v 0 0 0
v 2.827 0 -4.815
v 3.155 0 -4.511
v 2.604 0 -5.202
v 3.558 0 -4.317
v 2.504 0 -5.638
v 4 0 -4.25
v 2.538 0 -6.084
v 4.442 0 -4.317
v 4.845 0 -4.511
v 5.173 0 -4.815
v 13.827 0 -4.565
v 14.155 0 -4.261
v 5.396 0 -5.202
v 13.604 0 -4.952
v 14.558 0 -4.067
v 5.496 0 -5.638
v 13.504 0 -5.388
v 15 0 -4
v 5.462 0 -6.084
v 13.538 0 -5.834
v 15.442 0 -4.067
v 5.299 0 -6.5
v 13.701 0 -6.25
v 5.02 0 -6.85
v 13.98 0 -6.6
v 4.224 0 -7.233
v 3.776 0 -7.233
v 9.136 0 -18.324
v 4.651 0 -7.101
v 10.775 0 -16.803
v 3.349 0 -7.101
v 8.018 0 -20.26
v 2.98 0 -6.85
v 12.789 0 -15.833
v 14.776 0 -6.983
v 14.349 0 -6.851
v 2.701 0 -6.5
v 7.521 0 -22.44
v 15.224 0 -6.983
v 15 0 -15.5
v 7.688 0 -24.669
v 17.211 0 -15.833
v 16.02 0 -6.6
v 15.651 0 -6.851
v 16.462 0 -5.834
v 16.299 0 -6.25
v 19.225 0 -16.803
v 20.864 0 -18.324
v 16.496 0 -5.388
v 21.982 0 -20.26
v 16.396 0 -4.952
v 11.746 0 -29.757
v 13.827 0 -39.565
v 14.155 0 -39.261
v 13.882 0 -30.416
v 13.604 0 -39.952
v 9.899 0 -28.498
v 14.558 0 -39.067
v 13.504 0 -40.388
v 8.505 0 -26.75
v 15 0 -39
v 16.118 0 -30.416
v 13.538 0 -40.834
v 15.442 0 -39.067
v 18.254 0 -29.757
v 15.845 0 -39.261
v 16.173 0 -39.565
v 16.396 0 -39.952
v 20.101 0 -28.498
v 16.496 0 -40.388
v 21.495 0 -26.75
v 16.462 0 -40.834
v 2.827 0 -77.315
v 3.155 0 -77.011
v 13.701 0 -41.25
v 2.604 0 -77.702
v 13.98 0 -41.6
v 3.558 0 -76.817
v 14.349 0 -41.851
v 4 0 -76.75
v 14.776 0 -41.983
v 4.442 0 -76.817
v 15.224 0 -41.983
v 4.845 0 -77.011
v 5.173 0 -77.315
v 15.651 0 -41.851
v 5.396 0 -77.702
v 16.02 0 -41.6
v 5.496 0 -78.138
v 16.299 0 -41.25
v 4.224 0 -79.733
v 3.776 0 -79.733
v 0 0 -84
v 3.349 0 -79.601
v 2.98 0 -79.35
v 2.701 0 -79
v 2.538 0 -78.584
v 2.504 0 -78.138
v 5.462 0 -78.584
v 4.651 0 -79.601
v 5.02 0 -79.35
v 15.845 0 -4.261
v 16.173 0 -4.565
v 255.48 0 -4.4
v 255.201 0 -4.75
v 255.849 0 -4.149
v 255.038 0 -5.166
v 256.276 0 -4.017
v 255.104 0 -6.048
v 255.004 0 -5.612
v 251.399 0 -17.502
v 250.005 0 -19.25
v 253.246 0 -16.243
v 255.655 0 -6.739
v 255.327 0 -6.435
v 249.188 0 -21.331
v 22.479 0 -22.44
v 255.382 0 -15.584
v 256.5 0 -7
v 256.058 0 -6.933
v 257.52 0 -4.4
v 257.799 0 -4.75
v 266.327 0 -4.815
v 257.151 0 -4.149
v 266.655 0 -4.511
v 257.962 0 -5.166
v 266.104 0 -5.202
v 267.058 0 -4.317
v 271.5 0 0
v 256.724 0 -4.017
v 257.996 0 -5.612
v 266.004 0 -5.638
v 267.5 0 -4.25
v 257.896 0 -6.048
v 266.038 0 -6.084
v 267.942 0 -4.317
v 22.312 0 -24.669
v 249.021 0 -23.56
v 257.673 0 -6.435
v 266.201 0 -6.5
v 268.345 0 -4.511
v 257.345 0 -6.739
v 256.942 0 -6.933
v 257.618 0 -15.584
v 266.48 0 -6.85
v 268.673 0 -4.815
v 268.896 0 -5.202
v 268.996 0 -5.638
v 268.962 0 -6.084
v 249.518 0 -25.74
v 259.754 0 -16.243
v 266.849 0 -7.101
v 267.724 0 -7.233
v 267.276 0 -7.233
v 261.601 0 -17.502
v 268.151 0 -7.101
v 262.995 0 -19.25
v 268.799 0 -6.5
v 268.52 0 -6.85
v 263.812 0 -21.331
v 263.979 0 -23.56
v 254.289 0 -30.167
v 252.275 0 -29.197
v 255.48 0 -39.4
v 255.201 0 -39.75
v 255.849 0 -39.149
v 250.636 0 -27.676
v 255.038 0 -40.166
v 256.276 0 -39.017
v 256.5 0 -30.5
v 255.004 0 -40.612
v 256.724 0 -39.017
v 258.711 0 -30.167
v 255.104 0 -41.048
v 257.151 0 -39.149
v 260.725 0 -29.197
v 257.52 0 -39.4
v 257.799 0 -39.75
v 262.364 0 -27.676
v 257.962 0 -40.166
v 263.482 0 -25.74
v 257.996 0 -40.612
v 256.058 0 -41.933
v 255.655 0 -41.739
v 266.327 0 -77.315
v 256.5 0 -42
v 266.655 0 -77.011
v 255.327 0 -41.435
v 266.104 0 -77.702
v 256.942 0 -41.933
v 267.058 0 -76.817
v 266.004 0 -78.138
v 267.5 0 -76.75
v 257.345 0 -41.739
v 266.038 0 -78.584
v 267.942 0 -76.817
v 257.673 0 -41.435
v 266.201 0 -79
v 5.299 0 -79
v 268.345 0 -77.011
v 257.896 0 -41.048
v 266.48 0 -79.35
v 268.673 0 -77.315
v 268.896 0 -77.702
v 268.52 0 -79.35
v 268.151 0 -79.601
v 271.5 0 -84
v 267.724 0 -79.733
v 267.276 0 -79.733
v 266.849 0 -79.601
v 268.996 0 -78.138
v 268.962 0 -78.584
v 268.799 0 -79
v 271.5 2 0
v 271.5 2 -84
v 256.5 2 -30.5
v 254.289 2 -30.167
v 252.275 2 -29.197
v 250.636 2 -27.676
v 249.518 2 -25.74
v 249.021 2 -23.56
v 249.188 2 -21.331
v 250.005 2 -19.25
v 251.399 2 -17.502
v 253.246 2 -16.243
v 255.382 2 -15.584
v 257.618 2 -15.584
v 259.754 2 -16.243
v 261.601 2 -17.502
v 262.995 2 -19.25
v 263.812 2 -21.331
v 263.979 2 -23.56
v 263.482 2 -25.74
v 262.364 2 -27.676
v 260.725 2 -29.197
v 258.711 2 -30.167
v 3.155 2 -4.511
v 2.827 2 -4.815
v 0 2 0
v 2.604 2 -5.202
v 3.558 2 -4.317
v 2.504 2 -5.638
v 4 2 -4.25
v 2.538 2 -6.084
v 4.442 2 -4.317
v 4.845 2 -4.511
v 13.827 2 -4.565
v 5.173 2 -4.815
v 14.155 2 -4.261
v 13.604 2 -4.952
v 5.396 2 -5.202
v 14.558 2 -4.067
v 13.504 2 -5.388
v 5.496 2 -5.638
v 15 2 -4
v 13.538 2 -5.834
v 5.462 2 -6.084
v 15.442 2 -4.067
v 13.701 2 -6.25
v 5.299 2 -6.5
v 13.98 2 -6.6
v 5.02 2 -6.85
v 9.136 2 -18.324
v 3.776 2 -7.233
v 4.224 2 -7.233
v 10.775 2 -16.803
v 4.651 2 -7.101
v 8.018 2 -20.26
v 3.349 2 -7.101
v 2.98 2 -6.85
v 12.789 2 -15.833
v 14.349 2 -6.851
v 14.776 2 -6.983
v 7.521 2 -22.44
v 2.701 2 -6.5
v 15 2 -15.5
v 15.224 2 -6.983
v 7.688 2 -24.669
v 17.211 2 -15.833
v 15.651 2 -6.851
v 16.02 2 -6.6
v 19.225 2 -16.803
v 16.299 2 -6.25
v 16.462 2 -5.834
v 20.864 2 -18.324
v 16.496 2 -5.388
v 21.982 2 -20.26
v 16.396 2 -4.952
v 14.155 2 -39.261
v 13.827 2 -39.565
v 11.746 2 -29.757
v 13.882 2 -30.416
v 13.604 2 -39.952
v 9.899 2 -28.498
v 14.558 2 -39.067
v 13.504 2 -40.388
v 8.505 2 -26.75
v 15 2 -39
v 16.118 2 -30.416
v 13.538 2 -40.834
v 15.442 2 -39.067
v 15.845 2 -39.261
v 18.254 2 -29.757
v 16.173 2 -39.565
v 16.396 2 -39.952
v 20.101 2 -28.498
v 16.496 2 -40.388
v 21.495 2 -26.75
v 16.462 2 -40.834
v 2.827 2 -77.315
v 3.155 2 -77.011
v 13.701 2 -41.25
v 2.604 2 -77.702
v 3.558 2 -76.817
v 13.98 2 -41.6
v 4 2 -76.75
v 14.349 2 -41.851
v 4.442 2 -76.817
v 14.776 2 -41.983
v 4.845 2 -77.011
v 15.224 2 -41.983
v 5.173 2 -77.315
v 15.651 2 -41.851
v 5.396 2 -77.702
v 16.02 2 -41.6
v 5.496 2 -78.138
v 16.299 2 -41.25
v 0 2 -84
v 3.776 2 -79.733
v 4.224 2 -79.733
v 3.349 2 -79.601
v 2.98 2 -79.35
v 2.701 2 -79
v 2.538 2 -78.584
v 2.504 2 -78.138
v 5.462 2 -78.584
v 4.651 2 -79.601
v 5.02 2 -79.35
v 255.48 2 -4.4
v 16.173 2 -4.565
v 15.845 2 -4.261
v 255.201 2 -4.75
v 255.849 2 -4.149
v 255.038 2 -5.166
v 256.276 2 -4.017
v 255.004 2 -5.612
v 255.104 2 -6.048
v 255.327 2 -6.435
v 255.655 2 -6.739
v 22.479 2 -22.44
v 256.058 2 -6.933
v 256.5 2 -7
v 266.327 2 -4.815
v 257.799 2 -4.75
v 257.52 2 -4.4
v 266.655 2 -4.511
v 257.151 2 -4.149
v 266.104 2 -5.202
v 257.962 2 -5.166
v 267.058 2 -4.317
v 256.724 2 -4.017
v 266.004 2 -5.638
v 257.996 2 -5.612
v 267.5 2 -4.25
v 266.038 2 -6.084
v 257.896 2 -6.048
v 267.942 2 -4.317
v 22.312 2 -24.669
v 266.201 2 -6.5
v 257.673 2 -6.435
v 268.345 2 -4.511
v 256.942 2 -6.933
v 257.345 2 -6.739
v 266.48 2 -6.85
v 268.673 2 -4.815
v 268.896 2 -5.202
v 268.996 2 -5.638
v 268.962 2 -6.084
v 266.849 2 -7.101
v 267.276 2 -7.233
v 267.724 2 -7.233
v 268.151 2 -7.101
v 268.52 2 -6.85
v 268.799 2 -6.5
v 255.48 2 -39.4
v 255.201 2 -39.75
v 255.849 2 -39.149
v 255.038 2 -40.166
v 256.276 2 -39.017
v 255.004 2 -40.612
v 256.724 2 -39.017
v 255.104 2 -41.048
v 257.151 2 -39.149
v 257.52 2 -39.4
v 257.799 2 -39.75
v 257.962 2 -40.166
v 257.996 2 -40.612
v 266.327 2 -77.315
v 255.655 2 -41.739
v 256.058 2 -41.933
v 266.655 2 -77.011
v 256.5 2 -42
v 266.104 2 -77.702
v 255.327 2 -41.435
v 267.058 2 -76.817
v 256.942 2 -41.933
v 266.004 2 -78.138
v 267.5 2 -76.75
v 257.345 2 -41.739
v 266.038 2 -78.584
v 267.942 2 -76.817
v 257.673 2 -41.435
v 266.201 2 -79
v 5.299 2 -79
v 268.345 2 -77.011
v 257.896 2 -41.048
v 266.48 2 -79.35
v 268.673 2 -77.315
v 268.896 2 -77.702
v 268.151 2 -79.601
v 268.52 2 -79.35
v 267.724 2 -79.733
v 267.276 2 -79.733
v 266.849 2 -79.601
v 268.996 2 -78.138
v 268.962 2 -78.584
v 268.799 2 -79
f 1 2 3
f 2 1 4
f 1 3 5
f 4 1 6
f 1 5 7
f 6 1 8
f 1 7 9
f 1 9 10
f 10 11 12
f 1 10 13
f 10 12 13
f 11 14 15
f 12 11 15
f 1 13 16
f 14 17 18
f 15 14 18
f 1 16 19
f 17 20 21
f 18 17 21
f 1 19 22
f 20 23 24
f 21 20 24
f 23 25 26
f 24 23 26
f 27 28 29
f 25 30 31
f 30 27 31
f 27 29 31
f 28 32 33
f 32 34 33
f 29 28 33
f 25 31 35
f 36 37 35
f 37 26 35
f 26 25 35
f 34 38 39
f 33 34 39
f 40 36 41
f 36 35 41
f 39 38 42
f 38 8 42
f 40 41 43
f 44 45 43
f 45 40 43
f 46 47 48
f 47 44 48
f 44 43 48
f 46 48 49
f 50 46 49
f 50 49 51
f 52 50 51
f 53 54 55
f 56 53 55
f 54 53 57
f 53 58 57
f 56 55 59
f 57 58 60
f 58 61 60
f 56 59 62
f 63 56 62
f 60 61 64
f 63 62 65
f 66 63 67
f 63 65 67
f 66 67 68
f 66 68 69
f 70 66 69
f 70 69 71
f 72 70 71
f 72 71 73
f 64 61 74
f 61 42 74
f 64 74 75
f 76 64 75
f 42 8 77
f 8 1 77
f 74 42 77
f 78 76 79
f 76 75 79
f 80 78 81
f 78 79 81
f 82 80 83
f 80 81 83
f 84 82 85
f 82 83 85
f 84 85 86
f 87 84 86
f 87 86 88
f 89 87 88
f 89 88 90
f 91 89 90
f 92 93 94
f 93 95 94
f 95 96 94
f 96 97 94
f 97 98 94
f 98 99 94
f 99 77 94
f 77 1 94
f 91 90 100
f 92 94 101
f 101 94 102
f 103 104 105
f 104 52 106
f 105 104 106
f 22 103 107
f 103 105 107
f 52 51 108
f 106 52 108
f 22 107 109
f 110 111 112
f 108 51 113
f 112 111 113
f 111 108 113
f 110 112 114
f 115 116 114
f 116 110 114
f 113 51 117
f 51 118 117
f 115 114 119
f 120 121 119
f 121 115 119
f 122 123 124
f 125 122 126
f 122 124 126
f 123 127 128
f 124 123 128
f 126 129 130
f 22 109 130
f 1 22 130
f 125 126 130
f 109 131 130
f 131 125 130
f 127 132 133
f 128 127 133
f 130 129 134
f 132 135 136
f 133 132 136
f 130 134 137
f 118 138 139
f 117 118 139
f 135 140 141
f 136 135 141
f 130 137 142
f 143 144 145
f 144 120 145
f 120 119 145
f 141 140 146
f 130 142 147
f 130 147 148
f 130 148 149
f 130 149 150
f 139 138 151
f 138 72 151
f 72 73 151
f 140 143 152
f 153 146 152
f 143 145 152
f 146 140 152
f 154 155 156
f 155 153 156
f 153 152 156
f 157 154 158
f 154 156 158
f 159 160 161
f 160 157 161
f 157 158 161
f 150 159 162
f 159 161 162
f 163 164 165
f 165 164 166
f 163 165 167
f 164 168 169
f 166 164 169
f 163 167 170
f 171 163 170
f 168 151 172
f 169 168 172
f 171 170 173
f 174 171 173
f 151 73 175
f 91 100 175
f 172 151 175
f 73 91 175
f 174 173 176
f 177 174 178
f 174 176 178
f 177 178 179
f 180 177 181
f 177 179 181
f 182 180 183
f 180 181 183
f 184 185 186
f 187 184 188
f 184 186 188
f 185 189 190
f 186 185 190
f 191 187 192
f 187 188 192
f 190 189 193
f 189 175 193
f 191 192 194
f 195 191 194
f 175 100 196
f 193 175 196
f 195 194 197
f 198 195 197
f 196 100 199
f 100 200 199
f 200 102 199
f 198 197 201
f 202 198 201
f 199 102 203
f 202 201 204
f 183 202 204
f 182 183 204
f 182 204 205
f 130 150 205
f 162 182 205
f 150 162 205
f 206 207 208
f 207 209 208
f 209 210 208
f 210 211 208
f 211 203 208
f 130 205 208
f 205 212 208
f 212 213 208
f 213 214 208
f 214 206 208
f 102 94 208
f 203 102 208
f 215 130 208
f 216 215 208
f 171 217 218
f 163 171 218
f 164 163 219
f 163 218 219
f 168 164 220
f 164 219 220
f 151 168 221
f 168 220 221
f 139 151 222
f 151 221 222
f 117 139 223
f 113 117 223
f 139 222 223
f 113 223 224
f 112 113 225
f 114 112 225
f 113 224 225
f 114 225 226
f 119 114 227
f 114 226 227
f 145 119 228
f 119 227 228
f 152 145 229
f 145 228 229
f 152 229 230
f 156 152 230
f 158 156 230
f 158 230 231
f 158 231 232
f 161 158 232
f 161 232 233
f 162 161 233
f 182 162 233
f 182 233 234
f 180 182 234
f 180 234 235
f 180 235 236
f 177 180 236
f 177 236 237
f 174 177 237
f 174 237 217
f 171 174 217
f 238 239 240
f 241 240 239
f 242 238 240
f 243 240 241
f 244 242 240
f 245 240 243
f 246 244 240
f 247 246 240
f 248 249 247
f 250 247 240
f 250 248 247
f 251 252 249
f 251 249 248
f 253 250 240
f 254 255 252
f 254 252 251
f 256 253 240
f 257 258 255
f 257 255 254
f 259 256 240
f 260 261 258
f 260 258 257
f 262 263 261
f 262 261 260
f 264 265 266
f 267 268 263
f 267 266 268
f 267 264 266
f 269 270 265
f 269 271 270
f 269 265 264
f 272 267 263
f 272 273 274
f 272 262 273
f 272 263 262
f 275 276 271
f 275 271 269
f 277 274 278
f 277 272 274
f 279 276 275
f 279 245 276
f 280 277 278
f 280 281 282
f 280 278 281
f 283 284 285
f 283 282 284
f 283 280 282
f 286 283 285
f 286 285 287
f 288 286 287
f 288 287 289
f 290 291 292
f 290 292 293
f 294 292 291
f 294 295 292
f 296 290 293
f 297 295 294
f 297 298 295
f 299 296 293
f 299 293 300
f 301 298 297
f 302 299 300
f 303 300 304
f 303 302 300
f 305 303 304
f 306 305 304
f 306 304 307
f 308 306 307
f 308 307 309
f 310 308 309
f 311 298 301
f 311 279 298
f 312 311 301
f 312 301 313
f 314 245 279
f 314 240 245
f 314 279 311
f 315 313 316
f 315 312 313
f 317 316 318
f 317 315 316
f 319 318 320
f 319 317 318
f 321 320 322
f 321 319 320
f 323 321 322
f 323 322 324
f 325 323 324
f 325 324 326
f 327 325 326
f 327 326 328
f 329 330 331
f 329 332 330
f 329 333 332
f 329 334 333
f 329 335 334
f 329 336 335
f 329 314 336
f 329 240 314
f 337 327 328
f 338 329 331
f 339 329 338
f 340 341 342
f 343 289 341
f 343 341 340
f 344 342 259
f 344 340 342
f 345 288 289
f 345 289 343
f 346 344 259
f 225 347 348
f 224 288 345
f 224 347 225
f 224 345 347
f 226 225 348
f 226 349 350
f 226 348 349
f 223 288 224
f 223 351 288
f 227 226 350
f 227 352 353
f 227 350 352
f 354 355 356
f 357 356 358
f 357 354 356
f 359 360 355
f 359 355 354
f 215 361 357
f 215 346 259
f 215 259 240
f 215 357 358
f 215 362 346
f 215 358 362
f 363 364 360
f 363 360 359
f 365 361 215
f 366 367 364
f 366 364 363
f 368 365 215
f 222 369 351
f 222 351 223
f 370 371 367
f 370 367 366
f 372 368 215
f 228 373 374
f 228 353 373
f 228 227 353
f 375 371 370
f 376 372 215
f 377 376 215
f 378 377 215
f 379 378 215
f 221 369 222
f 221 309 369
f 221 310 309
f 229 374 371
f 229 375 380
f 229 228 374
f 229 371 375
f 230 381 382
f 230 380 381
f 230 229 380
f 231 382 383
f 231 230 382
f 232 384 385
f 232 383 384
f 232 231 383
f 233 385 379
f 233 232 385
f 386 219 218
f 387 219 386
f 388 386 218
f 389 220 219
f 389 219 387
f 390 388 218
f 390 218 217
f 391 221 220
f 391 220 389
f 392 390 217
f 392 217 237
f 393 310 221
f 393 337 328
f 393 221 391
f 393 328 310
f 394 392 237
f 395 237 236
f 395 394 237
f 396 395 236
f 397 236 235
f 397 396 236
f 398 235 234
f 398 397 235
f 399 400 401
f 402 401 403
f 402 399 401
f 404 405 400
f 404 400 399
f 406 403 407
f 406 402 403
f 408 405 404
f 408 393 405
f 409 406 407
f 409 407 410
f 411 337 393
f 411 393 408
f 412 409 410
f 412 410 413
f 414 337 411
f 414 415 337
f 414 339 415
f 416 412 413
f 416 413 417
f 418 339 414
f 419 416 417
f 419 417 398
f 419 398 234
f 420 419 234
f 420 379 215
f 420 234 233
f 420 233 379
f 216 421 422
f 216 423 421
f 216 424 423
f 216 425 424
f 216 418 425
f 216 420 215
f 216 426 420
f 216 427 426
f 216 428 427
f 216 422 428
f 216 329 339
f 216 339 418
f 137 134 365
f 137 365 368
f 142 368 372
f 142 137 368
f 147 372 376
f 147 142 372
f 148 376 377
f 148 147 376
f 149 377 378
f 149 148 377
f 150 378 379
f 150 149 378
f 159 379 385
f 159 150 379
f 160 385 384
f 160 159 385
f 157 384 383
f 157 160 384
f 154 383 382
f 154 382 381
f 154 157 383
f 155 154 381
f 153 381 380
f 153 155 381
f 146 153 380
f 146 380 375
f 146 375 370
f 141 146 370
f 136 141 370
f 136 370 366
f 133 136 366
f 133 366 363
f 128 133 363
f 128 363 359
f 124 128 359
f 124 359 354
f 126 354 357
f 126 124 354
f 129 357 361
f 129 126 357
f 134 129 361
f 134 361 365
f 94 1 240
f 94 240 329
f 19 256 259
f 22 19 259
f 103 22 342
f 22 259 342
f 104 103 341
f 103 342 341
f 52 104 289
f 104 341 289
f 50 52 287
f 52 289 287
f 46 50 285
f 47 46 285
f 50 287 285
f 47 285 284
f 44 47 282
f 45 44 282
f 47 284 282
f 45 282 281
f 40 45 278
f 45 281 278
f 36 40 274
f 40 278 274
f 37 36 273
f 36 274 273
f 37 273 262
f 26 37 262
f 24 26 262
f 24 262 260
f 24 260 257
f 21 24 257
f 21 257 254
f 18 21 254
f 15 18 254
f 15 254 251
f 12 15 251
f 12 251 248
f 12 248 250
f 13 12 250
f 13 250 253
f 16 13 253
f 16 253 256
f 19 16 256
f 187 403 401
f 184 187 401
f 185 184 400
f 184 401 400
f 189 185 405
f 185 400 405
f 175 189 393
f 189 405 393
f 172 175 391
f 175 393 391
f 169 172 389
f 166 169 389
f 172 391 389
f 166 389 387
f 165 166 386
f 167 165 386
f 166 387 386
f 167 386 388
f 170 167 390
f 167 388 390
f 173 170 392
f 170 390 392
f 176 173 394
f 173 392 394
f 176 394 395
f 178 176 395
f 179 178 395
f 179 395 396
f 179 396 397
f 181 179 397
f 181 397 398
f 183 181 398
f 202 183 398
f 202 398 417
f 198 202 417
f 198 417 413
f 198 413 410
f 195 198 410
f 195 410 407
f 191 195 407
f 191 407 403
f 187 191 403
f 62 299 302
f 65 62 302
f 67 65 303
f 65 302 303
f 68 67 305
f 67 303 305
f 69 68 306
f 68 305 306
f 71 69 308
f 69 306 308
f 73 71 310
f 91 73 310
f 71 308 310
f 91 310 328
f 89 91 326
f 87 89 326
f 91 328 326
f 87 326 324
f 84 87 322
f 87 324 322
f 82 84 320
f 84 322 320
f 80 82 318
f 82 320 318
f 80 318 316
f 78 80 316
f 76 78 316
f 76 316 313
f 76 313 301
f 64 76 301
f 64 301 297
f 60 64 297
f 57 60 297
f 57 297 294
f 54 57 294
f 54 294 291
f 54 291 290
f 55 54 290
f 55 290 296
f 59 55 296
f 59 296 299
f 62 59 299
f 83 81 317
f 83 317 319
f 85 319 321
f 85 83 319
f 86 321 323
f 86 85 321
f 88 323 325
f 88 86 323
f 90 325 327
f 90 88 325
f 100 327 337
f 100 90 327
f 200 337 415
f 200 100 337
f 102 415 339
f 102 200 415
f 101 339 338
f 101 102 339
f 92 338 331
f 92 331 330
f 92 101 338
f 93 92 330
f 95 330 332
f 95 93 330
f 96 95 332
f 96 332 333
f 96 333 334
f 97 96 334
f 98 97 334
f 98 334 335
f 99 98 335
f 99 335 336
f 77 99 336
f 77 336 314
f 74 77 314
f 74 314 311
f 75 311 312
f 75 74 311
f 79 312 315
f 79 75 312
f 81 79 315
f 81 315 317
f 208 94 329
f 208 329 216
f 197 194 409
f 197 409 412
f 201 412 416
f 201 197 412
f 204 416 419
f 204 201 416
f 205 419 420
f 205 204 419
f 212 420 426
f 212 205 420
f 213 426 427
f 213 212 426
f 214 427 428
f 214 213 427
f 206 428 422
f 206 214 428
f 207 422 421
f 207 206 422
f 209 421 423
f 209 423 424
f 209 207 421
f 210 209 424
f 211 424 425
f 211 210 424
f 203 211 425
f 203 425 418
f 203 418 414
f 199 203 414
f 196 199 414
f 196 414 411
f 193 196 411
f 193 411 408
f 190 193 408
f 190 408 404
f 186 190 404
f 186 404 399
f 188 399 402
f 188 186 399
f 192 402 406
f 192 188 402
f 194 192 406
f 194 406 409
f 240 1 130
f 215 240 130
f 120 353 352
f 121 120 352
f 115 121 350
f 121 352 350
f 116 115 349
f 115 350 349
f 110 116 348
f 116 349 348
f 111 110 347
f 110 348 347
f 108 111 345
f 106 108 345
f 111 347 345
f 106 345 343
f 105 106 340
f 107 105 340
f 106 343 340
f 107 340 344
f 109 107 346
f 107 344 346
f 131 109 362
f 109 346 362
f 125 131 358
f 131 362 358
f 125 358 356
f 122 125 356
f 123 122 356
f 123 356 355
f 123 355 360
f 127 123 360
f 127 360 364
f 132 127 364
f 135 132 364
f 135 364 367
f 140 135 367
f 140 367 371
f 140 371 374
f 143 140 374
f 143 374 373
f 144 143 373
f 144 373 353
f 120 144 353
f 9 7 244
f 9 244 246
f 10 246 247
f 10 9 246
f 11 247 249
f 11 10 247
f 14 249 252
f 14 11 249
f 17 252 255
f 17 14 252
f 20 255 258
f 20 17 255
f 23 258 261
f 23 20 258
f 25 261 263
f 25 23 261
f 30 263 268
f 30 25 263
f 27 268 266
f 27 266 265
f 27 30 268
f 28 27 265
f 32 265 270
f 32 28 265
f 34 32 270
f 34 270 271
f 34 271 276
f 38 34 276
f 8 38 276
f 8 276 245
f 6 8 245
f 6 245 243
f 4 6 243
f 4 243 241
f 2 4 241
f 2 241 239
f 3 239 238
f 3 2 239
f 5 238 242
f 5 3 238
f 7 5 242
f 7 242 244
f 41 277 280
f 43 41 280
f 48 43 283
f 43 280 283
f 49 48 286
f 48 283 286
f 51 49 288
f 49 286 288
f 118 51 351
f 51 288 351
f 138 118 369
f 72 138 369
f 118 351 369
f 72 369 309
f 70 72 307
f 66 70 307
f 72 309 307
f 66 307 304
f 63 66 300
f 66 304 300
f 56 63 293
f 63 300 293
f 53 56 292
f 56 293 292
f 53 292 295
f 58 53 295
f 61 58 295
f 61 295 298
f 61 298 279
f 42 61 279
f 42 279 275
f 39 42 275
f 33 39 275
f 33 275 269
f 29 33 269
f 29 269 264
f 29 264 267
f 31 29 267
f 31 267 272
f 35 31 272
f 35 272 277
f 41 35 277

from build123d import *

# Parameters (mm, degrees)
SKETCH1_W           = 271.5
SKETCH1_H           = 84
SKETCH1_R           = 1.5
BOSS_EXTRUDE1_DEPTH = 2
SKETCH2_R           = 1.5
SKETCH2_R_2         = 7.5
CUT_EXTRUDE1_DEPTH  = 10


with BuildPart() as part:
    # Sketch1 → Boss-Extrude1 (new body)
    with BuildSketch(Plane(origin=(0, 0, 0), x_dir=(1, 0, 0), z_dir=(0, 1, 0))):
        with Locations((135.75, 42)):
            Rectangle(SKETCH1_W, SKETCH1_H)
        with Locations(Location((4, 5.75, 0), (0, 0, 270))):
            Circle(SKETCH1_R, mode=Mode.SUBTRACT)
        with Locations(Location((4, 78.25, 0), (0, 0, 270))):
            Circle(SKETCH1_R, mode=Mode.SUBTRACT)
        with Locations(Location((267.5, 5.75, 0), (0, 0, 270))):
            Circle(SKETCH1_R, mode=Mode.SUBTRACT)
        with Locations(Location((267.5, 78.25, 0), (0, 0, 270))):
            Circle(SKETCH1_R, mode=Mode.SUBTRACT)
    extrude(amount=BOSS_EXTRUDE1_DEPTH)

    # Sketch2 → Cut-Extrude1 (cut)
    with BuildSketch(Plane(origin=(0, 2, 0), x_dir=(1, 0, 0), z_dir=(0, 1, 0))):
        with Locations(Location((15, 5.5, 0), (0, 0, 270))):
            Circle(SKETCH2_R)
        with Locations(Location((15, 40.5, 0), (0, 0, 270))):
            Circle(SKETCH2_R)
        with Locations(Location((15, 23, 0), (0, 0, 270))):
            Circle(SKETCH2_R_2)
        with Locations(Location((256.5, 23, 0), (0, 0, 90))):
            Circle(SKETCH2_R_2)
        with Locations(Location((256.5, 40.5, 0), (0, 0, 90))):
            Circle(SKETCH2_R)
        with Locations(Location((256.5, 5.5, 0), (0, 0, 90))):
            Circle(SKETCH2_R)
    extrude(amount=-CUT_EXTRUDE1_DEPTH, mode=Mode.SUBTRACT)


solid = part.part
